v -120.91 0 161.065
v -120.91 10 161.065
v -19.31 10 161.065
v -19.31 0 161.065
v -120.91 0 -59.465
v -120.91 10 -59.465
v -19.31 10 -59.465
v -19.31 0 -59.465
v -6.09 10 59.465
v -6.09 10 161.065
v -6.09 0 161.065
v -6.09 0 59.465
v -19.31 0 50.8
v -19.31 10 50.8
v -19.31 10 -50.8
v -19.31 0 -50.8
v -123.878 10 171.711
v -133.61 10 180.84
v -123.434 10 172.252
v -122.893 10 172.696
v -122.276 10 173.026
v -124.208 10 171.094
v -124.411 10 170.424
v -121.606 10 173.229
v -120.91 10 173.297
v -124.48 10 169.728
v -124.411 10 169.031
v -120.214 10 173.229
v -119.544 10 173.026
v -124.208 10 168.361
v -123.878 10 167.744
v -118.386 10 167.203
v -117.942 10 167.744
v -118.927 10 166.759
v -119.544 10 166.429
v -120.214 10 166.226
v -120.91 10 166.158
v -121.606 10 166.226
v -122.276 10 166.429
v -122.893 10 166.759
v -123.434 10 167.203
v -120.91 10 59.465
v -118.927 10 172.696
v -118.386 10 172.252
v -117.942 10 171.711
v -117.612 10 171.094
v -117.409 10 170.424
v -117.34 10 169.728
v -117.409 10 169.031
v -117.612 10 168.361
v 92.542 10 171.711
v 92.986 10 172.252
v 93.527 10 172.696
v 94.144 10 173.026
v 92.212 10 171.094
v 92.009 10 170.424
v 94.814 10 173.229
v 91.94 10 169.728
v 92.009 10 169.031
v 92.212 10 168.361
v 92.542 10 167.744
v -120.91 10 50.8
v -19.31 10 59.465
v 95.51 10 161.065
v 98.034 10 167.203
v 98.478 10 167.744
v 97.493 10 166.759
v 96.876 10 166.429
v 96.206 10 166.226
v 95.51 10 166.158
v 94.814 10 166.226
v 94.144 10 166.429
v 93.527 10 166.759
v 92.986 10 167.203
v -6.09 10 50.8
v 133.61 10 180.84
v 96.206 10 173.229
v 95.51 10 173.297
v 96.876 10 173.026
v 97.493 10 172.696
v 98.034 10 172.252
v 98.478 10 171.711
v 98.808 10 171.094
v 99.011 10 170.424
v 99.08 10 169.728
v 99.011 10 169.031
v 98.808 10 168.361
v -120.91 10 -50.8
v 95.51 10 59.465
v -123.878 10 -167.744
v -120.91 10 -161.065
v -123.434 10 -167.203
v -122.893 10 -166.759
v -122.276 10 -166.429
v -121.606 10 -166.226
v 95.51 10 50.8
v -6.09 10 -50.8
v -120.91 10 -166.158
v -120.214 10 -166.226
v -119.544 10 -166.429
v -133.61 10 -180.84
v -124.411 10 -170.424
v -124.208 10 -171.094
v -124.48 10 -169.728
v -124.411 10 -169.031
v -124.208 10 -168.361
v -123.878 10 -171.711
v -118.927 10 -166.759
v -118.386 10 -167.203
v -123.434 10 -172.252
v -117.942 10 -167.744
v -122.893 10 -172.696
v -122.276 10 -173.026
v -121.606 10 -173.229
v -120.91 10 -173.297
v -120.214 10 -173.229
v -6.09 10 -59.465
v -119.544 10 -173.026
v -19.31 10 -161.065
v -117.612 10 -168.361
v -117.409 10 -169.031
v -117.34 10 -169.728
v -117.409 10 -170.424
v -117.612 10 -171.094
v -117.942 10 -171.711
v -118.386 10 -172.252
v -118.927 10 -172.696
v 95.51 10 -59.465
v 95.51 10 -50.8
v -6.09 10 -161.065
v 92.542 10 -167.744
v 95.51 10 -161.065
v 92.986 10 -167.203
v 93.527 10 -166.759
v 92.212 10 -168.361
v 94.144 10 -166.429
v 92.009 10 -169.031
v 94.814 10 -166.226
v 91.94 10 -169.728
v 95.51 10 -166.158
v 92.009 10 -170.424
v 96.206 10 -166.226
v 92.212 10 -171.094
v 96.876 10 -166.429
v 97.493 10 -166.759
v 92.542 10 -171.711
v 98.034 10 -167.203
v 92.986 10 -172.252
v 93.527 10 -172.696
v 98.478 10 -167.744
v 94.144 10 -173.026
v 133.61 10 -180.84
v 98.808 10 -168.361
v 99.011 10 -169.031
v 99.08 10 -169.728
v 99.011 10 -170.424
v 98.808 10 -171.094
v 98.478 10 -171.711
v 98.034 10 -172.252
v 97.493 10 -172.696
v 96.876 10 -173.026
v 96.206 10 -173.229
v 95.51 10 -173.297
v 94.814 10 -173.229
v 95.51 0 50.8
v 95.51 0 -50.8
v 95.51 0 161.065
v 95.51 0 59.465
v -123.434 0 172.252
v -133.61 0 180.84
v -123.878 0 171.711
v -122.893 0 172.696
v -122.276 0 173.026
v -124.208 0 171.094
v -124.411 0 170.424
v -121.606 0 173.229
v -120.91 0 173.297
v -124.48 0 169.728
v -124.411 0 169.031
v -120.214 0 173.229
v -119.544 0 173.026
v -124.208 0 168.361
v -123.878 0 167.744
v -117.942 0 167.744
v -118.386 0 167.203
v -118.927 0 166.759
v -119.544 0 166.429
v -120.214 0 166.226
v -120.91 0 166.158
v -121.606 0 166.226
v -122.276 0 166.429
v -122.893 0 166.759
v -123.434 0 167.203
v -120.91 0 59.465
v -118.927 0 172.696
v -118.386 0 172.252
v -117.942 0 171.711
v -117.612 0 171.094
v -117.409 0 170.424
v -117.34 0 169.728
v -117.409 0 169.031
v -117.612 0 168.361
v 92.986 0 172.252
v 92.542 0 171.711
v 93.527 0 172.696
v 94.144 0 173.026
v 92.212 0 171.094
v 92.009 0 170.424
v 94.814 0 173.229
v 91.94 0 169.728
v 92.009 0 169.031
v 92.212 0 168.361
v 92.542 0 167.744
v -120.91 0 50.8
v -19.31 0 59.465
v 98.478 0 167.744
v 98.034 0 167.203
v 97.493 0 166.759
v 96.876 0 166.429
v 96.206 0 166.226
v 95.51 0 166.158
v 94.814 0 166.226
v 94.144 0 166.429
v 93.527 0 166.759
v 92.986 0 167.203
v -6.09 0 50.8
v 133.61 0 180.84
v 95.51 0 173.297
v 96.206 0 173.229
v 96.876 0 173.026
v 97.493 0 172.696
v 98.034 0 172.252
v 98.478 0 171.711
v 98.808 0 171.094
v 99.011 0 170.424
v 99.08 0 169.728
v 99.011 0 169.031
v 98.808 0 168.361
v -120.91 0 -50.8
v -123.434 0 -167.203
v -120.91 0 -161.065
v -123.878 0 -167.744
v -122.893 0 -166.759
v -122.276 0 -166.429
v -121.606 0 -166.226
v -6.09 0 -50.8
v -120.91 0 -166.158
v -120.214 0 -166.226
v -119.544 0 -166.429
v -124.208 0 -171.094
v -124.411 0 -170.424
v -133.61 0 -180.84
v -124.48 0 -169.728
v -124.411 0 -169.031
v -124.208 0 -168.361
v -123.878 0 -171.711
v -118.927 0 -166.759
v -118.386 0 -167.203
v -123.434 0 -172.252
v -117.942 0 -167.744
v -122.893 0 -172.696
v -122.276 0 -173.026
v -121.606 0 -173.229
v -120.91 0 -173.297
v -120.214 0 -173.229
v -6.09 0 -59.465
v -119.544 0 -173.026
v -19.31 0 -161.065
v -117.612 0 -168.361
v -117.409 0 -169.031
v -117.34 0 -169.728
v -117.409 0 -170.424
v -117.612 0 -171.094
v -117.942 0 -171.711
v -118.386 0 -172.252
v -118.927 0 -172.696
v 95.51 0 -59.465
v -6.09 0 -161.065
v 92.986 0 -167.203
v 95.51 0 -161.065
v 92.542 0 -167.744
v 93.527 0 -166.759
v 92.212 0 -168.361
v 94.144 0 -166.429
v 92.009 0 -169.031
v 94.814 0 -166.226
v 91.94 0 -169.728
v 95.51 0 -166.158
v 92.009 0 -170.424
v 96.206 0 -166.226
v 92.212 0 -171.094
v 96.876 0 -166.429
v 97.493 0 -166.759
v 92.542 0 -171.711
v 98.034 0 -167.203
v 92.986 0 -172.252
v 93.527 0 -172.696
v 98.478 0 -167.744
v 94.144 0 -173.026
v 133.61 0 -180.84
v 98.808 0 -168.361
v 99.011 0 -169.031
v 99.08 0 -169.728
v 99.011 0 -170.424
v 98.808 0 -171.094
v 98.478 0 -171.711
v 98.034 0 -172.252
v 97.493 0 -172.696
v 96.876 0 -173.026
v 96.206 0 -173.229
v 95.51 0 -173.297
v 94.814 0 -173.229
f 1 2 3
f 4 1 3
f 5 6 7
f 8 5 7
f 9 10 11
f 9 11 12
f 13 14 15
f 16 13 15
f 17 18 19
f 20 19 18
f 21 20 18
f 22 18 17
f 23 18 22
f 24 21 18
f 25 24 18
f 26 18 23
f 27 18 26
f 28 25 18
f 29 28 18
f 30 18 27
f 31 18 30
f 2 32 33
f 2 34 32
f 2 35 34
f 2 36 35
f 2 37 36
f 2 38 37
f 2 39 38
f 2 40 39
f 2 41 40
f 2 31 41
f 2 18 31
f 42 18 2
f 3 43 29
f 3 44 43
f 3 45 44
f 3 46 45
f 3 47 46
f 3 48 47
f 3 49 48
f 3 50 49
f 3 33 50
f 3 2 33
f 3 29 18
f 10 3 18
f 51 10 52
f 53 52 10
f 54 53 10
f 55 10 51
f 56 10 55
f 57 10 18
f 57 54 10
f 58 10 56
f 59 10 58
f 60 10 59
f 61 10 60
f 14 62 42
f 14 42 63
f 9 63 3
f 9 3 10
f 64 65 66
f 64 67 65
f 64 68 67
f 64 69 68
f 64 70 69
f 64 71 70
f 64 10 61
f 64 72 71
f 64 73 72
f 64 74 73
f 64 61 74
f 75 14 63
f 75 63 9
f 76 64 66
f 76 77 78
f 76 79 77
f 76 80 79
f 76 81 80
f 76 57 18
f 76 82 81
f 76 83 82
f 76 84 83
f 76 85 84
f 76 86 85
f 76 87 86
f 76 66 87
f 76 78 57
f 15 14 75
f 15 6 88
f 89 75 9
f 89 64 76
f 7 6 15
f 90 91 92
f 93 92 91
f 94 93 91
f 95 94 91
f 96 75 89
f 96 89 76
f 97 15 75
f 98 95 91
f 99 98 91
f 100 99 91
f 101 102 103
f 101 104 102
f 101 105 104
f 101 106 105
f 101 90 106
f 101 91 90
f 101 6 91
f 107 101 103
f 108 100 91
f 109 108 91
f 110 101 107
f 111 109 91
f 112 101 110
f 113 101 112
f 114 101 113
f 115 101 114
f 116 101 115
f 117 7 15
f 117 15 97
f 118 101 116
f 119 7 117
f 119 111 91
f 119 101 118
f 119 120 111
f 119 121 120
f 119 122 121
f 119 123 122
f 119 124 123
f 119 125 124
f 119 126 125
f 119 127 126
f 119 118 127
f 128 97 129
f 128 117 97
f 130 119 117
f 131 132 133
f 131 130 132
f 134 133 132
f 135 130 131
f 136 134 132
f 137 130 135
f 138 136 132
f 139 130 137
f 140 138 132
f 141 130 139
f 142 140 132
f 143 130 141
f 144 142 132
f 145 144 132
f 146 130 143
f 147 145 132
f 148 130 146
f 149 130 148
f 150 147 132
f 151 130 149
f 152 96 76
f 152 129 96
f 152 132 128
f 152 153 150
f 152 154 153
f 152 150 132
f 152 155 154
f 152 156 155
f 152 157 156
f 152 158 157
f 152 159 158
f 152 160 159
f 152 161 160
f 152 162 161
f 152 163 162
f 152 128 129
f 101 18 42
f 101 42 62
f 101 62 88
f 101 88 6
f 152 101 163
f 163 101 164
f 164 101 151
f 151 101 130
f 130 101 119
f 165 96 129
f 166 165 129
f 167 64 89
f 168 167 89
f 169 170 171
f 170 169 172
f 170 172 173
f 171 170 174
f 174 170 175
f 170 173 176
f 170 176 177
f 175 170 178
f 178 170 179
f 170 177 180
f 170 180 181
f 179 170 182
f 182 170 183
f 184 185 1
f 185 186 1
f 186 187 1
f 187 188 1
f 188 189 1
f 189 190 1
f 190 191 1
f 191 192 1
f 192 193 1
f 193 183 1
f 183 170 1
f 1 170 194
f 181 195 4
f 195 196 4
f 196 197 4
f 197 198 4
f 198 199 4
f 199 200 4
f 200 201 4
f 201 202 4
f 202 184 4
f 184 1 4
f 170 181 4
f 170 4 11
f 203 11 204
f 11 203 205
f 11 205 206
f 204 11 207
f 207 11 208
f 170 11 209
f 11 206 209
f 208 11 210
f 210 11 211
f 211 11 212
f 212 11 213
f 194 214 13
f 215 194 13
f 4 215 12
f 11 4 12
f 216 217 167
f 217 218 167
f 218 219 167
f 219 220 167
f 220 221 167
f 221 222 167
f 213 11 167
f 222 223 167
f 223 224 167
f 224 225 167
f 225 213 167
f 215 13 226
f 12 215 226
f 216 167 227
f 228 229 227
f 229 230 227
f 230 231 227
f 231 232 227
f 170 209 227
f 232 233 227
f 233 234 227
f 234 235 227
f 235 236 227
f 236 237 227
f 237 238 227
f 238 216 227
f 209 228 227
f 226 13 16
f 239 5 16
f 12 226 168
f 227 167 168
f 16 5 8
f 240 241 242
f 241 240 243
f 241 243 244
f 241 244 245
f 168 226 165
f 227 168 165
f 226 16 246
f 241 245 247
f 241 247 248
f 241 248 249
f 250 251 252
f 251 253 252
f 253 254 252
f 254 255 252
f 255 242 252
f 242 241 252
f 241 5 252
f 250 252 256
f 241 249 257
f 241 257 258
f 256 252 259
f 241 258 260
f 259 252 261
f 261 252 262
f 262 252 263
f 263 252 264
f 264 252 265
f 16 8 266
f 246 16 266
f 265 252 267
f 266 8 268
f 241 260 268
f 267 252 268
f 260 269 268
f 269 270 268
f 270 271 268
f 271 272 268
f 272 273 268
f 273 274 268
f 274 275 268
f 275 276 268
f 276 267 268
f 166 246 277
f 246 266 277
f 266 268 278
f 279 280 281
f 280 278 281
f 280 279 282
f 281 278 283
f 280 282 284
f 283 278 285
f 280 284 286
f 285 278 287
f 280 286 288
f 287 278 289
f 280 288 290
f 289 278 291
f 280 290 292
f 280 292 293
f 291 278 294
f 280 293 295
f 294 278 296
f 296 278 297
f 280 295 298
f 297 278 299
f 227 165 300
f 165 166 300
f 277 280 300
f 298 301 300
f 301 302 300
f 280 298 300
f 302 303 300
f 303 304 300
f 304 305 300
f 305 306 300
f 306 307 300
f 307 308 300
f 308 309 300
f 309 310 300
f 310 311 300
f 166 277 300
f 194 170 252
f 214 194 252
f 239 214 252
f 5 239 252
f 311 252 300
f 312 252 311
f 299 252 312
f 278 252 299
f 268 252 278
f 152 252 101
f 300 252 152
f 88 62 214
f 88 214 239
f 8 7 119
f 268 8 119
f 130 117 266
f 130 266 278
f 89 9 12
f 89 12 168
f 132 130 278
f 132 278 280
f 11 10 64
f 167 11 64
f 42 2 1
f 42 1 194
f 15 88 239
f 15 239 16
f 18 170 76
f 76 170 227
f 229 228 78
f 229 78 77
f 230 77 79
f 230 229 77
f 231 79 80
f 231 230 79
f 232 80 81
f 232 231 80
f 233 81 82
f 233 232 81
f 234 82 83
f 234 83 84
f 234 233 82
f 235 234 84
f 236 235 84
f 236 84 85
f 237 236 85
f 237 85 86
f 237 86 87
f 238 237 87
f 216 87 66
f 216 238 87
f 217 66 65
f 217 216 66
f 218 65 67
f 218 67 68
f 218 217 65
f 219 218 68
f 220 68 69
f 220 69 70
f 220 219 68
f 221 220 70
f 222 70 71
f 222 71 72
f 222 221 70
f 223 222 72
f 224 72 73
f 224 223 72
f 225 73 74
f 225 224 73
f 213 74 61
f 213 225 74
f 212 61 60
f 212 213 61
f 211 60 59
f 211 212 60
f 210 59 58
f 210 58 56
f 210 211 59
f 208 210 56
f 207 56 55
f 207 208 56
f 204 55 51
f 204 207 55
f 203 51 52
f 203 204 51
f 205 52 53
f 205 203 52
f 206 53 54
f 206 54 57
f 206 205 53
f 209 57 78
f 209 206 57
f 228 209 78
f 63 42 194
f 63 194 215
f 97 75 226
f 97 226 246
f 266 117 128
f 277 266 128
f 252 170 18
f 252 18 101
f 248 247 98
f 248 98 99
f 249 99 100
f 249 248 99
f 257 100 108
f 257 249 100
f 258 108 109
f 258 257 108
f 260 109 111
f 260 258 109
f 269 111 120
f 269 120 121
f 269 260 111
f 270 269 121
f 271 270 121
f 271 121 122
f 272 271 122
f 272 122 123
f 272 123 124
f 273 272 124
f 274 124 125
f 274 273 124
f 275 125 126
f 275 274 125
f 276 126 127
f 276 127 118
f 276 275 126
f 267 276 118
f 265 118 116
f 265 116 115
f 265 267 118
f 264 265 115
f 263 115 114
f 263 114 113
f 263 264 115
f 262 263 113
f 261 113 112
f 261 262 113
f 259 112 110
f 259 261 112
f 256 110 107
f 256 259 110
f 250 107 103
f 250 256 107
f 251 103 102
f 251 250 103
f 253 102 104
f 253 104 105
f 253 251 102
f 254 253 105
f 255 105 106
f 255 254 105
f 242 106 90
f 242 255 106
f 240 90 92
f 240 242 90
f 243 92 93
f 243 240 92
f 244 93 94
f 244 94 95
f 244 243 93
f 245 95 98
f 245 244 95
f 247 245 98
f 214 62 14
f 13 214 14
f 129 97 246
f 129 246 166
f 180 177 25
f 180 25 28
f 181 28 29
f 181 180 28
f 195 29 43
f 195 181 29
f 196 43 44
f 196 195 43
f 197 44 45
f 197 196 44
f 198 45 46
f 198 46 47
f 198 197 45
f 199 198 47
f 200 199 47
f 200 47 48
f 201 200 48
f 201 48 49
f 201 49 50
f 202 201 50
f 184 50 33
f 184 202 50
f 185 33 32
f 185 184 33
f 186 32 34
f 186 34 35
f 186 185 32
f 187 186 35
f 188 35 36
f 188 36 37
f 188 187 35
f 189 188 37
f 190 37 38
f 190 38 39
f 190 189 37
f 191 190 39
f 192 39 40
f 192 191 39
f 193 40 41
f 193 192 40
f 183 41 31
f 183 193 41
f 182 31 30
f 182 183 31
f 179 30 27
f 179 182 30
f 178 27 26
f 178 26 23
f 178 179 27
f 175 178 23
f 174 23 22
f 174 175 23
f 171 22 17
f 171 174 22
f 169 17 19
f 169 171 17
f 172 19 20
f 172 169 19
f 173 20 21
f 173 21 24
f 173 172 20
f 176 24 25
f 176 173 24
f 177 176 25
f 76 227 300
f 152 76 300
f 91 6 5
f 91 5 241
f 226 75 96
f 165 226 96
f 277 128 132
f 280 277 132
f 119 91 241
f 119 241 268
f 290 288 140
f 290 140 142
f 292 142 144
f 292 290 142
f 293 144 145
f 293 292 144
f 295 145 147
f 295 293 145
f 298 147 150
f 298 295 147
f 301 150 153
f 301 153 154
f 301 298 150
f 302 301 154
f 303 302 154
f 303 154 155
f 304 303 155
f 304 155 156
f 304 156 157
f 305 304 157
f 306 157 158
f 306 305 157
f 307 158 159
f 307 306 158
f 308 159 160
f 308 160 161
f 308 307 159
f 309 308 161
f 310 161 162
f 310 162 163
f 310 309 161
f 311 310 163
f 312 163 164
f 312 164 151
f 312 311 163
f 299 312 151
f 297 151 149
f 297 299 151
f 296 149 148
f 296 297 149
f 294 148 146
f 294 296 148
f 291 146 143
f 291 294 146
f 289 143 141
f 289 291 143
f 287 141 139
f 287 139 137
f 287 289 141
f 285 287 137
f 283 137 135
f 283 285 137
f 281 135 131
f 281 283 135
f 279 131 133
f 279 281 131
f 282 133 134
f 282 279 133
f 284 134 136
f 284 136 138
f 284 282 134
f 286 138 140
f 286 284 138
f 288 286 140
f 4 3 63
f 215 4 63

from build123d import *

# Parameters (mm, degrees)
SKETCH1_W                 = 267.22
SKETCH1_H                 = 361.68
SKETCH1_R                 = 3.57
BOSS_EXTRUDE1_DEPTH       = 10
SKETCH2_W                 = 101.6
SKETCH2_H                 = 101.6
CUT_EXTRUDE1_DEPTH        = 226.066074076
LPATTERN1_COUNT           = 2
LPATTERN1_PITCH           = 110.265
LPATTERN2_COUNT           = 2
LPATTERN2_PITCH           = 110.265
LPATTERN3_COUNT           = 2
LPATTERN3_PITCH           = 114.82
LPATTERN3_COPY_1_SKETCH_W = 101.6
LPATTERN3_COPY_1_SKETCH_H = 101.6
LPATTERN3_COPY_1_DEPTH    = 226.066074076
LPATTERN3_COPY_2_SKETCH_W = 101.6
LPATTERN3_COPY_2_SKETCH_H = 101.6
LPATTERN3_COPY_2_DEPTH    = 226.066074076


with BuildPart() as part:
    # Sketch1 → Boss-Extrude1 (new body)
    with BuildSketch(Plane(origin=(0, 0, 0), x_dir=(1, 0, 0), z_dir=(0, 1, 0))):
        Rectangle(SKETCH1_W, SKETCH1_H)
        with Locations(Location((-120.91, -169.7275, 0), (0, 0, 270))):
            Circle(SKETCH1_R, mode=Mode.SUBTRACT)
        with Locations(Location((-120.91, 169.7275, 0), (0, 0, 270))):
            Circle(SKETCH1_R, mode=Mode.SUBTRACT)
        with Locations(Location((95.51, 169.7275, 0), (0, 0, 270))):
            Circle(SKETCH1_R, mode=Mode.SUBTRACT)
        with Locations(Location((95.51, -169.7275, 0), (0, 0, 270))):
            Circle(SKETCH1_R, mode=Mode.SUBTRACT)
    extrude(amount=BOSS_EXTRUDE1_DEPTH)

    # Sketch2 → Cut-Extrude1 (cut, through all)
    with BuildSketch(Plane(origin=(0, 10, 0), x_dir=(1, 0, 0), z_dir=(0, 1, 0))):
        with Locations((-70.11, 0)):
            Rectangle(SKETCH2_W, SKETCH2_H)
    cut_extrude1 = extrude(amount=-CUT_EXTRUDE1_DEPTH, mode=Mode.SUBTRACT)

    # LPattern1: Cut-Extrude1 ×2
    with Locations(*[(0, 0, -i * LPATTERN1_PITCH) for i in range(1, LPATTERN1_COUNT)]):
        add(cut_extrude1, mode=Mode.SUBTRACT)

    # LPattern2: Cut-Extrude1 ×2
    with Locations(*[(0, 0, i * LPATTERN2_PITCH) for i in range(1, LPATTERN2_COUNT)]):
        add(cut_extrude1, mode=Mode.SUBTRACT)

    # LPattern3: Cut-Extrude1 ×2
    with Locations(*[(i * LPATTERN3_PITCH, 0, 0) for i in range(1, LPATTERN3_COUNT)]):
        add(cut_extrude1, mode=Mode.SUBTRACT)

    # LPattern3 copy 1 sketch → LPattern3 copy 1 (cut, through all)
    with BuildSketch(Plane(origin=(114.82, 10, -110.265), x_dir=(1, 0, 0), z_dir=(0, 1, 0))):
        with Locations((-70.11, 0)):
            Rectangle(LPATTERN3_COPY_1_SKETCH_W, LPATTERN3_COPY_1_SKETCH_H)
    extrude(amount=-LPATTERN3_COPY_1_DEPTH, mode=Mode.SUBTRACT)

    # LPattern3 copy 2 sketch → LPattern3 copy 2 (cut, through all)
    with BuildSketch(Plane(origin=(114.82, 10, 110.265), x_dir=(1, 0, 0), z_dir=(0, 1, 0))):
        with Locations((-70.11, 0)):
            Rectangle(LPATTERN3_COPY_2_SKETCH_W, LPATTERN3_COPY_2_SKETCH_H)
    extrude(amount=-LPATTERN3_COPY_2_DEPTH, mode=Mode.SUBTRACT)


solid = part.part
